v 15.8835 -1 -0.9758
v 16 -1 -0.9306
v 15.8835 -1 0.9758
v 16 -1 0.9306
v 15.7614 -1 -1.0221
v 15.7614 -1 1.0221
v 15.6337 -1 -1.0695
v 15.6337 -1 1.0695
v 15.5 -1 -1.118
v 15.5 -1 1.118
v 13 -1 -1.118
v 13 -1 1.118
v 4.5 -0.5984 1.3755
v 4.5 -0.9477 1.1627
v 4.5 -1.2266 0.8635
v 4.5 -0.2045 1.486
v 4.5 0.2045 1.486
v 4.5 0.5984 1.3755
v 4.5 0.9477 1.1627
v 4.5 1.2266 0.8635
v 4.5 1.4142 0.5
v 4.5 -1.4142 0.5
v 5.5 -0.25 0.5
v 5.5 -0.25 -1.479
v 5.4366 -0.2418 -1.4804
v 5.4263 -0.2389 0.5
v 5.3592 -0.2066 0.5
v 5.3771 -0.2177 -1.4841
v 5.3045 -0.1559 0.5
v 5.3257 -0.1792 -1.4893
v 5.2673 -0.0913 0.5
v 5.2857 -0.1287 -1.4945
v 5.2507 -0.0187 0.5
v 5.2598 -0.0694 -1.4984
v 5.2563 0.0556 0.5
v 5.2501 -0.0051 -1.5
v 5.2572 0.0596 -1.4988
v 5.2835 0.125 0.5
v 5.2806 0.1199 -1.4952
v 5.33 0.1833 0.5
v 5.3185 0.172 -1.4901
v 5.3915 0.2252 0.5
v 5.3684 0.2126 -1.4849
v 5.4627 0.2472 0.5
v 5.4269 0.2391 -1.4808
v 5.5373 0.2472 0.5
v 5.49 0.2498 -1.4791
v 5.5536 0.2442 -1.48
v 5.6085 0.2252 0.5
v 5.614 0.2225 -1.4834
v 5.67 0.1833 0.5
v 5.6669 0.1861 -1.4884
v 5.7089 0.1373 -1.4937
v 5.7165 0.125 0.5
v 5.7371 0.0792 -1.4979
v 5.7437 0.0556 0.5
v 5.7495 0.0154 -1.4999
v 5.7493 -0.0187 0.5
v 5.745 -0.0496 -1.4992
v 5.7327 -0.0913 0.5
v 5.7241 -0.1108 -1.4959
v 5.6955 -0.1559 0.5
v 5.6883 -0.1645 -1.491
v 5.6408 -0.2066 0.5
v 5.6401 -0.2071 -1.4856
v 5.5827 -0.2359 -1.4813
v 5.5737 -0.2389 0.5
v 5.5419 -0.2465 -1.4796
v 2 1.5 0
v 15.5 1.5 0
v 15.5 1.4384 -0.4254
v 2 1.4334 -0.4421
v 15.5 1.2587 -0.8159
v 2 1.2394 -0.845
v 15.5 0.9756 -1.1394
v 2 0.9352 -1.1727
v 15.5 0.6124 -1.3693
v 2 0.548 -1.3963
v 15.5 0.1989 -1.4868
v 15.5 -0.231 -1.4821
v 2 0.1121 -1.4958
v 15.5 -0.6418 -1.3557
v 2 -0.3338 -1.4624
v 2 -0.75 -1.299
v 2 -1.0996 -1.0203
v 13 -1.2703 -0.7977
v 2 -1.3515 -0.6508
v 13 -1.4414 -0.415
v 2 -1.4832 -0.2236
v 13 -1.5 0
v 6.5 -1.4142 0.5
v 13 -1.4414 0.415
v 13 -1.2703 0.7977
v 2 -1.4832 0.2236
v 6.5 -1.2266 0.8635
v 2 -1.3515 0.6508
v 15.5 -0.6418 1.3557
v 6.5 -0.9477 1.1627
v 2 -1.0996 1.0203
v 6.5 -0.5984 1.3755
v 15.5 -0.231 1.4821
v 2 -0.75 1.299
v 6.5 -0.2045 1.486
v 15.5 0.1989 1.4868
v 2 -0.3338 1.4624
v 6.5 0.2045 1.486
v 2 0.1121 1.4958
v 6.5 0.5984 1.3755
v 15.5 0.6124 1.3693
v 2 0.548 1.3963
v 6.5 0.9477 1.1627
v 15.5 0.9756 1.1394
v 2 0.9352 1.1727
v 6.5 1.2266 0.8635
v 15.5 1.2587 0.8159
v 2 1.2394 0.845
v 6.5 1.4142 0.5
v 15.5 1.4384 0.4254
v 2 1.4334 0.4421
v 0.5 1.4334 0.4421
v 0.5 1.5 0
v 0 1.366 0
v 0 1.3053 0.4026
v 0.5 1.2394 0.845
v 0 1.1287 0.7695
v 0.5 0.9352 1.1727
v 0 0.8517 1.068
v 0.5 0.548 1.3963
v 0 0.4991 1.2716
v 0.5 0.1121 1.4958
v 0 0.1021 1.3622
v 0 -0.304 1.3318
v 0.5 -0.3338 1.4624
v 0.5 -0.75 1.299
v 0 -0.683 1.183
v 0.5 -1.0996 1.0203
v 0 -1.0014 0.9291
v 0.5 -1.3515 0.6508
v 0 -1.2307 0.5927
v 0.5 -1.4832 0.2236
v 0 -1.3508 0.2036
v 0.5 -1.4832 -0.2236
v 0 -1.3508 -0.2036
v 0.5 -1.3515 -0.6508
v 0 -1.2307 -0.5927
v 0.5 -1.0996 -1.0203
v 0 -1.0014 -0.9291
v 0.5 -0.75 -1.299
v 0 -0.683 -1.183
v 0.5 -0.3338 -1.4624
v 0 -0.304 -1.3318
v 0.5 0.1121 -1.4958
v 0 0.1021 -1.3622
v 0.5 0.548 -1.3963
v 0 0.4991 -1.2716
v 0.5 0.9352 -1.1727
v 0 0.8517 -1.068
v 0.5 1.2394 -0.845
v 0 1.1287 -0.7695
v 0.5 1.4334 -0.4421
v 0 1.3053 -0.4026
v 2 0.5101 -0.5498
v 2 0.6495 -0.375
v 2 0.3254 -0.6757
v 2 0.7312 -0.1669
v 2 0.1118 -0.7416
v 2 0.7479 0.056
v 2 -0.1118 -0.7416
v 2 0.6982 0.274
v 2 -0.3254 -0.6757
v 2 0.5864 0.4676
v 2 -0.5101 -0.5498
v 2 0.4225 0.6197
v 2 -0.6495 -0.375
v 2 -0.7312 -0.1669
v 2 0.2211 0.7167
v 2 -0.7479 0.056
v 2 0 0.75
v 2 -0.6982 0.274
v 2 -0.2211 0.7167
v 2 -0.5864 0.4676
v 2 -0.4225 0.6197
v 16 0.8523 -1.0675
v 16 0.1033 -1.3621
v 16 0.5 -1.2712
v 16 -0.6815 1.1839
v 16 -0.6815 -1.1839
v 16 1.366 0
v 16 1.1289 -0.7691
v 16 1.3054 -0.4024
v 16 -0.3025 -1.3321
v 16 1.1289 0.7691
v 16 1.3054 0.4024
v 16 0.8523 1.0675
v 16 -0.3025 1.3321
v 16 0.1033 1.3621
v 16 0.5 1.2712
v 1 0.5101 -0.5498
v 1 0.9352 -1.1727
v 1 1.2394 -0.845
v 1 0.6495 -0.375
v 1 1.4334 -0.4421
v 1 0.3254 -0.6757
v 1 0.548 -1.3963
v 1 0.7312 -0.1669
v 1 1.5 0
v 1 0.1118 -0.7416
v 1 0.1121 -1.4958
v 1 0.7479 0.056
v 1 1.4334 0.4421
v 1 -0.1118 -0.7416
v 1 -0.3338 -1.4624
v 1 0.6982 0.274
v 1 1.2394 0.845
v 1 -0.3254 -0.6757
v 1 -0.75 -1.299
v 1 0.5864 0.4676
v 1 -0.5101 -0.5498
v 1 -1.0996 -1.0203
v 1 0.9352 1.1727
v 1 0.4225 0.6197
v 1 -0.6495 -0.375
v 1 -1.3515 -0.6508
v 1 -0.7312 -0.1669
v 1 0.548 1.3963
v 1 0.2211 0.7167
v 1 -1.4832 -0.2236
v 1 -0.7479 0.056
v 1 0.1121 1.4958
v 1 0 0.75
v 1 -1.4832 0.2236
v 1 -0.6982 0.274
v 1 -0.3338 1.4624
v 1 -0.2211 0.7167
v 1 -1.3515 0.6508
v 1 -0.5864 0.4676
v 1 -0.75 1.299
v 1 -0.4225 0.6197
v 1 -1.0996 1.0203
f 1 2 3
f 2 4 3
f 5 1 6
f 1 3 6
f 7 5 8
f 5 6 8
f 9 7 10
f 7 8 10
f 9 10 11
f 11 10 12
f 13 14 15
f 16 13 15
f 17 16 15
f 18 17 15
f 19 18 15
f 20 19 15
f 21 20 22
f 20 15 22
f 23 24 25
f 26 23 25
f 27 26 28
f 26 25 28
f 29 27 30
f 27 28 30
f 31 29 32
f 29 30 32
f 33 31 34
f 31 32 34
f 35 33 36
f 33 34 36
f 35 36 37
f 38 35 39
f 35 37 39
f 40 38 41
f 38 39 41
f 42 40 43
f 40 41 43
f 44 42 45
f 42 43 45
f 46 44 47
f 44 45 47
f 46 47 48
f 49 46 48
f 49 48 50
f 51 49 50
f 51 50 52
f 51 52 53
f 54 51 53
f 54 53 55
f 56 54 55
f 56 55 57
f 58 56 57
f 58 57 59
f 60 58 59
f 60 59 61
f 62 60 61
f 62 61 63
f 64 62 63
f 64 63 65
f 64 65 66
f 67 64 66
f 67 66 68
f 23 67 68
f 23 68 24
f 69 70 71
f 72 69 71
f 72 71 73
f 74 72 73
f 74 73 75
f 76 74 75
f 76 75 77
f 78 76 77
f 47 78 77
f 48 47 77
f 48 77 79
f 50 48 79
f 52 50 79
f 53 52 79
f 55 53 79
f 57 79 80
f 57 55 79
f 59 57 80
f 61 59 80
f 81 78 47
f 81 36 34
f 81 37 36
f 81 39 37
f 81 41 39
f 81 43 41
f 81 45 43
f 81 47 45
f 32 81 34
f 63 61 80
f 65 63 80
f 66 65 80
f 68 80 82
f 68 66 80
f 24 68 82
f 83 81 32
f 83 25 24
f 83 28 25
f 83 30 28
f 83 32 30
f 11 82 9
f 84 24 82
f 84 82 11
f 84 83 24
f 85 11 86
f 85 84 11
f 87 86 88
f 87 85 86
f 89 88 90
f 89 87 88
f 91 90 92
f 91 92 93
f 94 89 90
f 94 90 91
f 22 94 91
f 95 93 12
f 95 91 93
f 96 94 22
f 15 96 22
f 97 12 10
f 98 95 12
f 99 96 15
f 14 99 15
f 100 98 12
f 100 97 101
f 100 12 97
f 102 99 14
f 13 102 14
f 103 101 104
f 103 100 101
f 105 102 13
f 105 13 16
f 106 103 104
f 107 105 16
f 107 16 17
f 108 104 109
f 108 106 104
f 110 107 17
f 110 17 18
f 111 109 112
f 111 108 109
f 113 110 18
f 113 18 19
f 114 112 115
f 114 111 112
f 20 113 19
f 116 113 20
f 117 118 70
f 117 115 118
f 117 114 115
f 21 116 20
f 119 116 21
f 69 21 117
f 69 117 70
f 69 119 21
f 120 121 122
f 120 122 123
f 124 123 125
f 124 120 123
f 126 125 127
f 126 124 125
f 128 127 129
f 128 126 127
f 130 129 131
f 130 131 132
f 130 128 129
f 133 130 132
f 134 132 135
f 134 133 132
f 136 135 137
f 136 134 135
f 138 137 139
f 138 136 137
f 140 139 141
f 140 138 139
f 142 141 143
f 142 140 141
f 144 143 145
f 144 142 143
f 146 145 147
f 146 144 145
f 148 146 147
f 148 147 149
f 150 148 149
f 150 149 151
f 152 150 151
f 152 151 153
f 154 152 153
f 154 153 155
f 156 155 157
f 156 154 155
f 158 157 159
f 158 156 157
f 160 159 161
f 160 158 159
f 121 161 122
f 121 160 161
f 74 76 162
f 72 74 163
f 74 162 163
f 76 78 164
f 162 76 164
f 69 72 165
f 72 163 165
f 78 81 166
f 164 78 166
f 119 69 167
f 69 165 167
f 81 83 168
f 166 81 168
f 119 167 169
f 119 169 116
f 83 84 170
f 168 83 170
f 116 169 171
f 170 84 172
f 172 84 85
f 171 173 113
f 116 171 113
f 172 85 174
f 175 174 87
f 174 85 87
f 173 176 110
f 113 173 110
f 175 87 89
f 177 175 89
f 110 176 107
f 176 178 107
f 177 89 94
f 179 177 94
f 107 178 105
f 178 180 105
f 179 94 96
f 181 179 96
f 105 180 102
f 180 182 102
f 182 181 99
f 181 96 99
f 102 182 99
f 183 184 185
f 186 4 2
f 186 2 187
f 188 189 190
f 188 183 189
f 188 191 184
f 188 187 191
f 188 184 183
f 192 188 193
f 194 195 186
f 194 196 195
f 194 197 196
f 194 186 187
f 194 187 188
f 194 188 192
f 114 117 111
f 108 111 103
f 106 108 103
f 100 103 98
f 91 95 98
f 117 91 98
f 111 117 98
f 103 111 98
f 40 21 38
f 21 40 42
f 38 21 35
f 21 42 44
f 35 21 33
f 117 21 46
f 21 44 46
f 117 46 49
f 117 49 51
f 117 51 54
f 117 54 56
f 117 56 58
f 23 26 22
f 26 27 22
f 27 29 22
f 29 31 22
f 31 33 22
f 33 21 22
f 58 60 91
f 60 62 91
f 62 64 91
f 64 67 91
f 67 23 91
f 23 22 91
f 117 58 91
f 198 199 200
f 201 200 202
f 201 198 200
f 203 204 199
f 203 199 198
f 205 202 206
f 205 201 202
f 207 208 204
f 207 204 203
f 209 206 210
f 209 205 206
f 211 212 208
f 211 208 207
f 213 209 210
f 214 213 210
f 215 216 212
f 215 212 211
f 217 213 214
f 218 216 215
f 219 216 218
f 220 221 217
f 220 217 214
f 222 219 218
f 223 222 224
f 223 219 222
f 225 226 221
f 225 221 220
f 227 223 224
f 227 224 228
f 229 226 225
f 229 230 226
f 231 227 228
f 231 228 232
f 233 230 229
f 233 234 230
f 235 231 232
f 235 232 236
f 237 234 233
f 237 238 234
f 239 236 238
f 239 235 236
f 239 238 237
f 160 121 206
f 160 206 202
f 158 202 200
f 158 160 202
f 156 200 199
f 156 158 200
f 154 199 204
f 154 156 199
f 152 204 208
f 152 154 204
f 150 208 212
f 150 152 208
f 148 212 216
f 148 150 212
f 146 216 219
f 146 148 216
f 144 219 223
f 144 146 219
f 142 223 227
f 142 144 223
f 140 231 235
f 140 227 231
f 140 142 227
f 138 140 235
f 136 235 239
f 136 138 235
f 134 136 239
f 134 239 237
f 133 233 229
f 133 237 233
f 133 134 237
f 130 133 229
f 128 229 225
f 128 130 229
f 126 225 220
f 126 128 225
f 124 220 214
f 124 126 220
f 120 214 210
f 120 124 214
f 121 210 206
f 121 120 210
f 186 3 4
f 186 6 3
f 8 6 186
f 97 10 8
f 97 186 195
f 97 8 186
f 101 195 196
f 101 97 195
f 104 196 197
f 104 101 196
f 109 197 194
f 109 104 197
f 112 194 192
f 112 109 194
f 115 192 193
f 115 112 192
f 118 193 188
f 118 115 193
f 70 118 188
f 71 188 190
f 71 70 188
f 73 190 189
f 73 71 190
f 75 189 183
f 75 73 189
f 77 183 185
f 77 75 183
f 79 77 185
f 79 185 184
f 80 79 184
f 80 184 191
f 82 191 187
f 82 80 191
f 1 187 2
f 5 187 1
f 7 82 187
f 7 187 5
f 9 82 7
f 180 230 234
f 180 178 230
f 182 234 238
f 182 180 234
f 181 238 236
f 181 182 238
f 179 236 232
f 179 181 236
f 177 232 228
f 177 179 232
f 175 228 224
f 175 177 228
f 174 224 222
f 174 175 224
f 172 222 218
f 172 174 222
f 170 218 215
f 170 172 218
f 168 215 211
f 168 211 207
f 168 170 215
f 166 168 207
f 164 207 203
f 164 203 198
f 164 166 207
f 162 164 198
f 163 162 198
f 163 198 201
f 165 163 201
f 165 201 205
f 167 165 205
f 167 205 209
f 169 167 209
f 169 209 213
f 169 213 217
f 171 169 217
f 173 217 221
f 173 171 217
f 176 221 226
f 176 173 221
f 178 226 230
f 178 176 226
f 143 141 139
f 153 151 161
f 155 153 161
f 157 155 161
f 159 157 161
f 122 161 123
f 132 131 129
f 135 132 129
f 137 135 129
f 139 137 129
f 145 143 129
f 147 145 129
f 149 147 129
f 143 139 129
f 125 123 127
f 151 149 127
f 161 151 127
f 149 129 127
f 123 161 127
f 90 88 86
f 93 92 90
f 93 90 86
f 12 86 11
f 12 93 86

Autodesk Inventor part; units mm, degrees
ref_plane "YZ Plane" through (0, 0, 0) normal (1, 0, 0) x (0, 1, 0)
sketch "Skizze" plane through (0, 0, 0) normal (1, 0, 0) x (0, 1, 0)
  circle A0 centre (0, 0) radius 1.5
  dimension "d1" = 3
extrude "Körper" add sketch "Skizze" along normal blind 16
chamfer "Fase1" distance 0.5 angle 15 1 edges at (0, -1.5, 0) measured on face at (10.6667, 1.4951, -0.1207)
chamfer "Skizze2" distance 0.5 angle 15 1 edges at (16, -1.5, 0) measured on face at (10.8333, 1.4951, -0.1207)
ref_plane "Arbeitsebene1" through (0, 0, 1.5) normal (0, 0, 1) x (1, 0, 0)
sketch "Skizze3" plane through (0, 0, 1.5) normal (0, 0, 1) x (1, 0, 0)
  line L0 (0, -1.366) -> (0, 1.366) projected
  point P0 (0, 0)
  point P1 (5.5, 0)
  point P2 (0, 0)
  dimension "d18" = 5.5
hole "Bohrung1" at (5.5, 0, 1.5) direction (0, 0, -1) diameter 0.5 end through all
sketch "Skizze4" plane through (0, 0, 0) normal (0, 1, 0) x (-1, 0, 0)
  line L0 (-0.5, 1.5) -> (-15.5, 1.5) projected
  line L1 (-4.5, 1.5) -> (-4.5, 0.5)
  line L2 (-4.5, 0.5) -> (-6.5, 0.5)
  line L3 (-6.5, 0.5) -> (-6.5, 1.5)
  line L4 (0, 1.366) -> (0, -1.366) projected
  line L5 (-0.5, -1.5) -> (-15.5, -1.5) projected
  point P0 (0, 0)
  point P1 (-5.5, 0.5)
  dimension "d26" = 2
  dimension "d27" = 5.5
  dimension "d28" = 1
extrude "Extrusion2" cut sketch "Skizze4" along normal through all both and the other way through all
ref_plane "Arbeitsebene2" through (0, -1.5, 0) normal (0, 1, 0) x (-1, 0, 0)
sketch "Skizze5" plane through (0, -1.5, 0) normal (0, 1, 0) x (-1, 0, 0)
  line L0 (-16, -1.366) -> (-16, 1.366) projected
  line L1 (-13, 2.5) -> (-16, 2.5)
  line L2 (-16, 2.5) -> (-16, -2.5)
  line L3 (-16, -2.5) -> (-13, -2.5)
  line L4 (-13, -2.5) -> (-13, 2.5)
  point P0 (0, 0)
  point P1 (-16, 0)
  dimension "d32" = 3
  dimension "d33" = 5
extrude "Extrusion3" cut sketch "Skizze5" along normal blind 0.5
sketch "Skizze6" plane through (0, 0, 0) normal (0, 1, 0) x (-1, 0, 0)
  line L0 (-0.5, 1.5) -> (-15.5, 1.5) projected
  line L1 (-1, 1.5) -> (-1, 0.75)
  line L2 (-1, 0.75) -> (-2, 0.75)
  line L3 (-2, 0.75) -> (-2, 1.5)
  line L4 (0, 0) -> (-4.4819, 0)
  dimension "d36" = 1
  dimension "d37" = 1
  dimension "d38" = 0.75
revolve "Umdrehung1" cut sketch "Skizze6" angle 360 about axis through (0, 0, 0) along (1, 0, 0)
equation "\"d1\" = NND"
equation "\"d8\" = PHH"
equation "\"d9\" = FAWI"
equation "\"d12\" = PHH"
equation "\"d4\" = PHH"
equation "\"d5\" = FAWI"
equation "\"d11\" = PHH"
equation "\"NND\" = 3"
equation "\"NLG\" = 8"
equation "\"PHH\" = 0.5"
equation "\"FAWI\" = 15deg"
equation "\"KAH\" = 0"
properties part number "ISO 2338 - 3 m6 x 8" material "Edelstahl, austenitisch"
